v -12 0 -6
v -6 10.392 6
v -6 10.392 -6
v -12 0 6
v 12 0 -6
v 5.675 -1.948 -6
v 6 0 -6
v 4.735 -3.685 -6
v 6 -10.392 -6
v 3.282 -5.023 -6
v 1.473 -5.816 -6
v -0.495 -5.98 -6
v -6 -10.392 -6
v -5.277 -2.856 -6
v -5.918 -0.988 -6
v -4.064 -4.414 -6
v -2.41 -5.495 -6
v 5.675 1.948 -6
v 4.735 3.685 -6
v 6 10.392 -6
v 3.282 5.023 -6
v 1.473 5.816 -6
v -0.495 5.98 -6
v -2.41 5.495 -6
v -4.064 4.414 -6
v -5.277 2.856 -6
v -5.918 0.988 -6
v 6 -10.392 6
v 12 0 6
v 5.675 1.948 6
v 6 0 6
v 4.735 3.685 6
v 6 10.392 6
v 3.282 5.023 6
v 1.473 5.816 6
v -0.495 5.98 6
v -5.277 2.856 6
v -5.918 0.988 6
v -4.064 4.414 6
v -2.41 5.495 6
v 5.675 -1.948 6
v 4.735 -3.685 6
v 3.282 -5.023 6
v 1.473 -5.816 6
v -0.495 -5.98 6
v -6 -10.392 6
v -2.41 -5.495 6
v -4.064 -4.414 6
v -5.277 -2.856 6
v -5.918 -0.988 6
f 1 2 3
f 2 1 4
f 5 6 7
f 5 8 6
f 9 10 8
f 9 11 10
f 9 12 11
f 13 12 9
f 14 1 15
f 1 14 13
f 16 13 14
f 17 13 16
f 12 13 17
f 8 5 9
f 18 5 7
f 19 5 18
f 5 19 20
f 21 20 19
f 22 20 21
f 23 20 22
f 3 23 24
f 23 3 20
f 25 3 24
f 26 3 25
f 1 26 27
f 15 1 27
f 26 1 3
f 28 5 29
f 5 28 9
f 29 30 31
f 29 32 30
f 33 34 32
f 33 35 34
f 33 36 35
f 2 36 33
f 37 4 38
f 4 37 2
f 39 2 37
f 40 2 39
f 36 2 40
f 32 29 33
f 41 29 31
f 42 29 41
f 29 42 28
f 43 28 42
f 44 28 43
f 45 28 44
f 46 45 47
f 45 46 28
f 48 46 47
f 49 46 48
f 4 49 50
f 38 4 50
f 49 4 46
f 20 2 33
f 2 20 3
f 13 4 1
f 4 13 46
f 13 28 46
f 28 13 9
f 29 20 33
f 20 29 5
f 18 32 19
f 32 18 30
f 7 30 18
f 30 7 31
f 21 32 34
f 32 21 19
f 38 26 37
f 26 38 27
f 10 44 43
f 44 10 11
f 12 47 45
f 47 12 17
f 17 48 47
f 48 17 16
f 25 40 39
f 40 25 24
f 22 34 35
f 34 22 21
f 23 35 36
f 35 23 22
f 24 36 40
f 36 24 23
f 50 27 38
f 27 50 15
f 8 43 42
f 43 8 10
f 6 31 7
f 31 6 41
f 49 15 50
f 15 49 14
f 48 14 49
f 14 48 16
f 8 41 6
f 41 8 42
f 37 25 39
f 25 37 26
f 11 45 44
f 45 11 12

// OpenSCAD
// file: metric_bolt_functions.scad
function get_metric_bolt_head_height(size) = size;
function get_metric_bolt_head_diameter(size) = size * 2;
function get_metric_bolt_washer_diameter_safe_working_clearance(size) = 
    (size < 20) ?
        4 * size
    :
        3 * size
;
// file: beam_hexagonal.scad
// include <../../config.scad>;

module beam_hexagonal(L, d, centre = true, suppress_shopping_outputs = false) {
    radius = d / 2;
    linear_extrude(L, center = centre) polygon([[radius, 0], [radius * cos(60), radius * sin(60)], [radius * cos(120), radius * sin(120)], [radius * cos(180), radius * sin(180)], [radius * cos(240), radius * sin(240)], [radius * cos(300), radius * sin(300)]]);
    // Shopping
    if (!suppress_shopping_outputs) {
        echo(str("Hexagonal beam: Hexagonal beam Φ", d, "mm x ", L, "mm - x1"));
    }
}

// $fn = 200;
beam_hexagonal(500, 50);
// main file
// include <../../config.scad>;
use <./beam_hexagonal.scad>;
use <./metric_bolt_functions.scad>;

module metric_nut(size, centre = true) {
    height = get_metric_bolt_head_height(size);
    diameter = get_metric_bolt_head_diameter(size);
    radius = diameter / 2;
    color("gray") difference() {
        // body
        beam_hexagonal(height, diameter, centre = centre, suppress_shopping_outputs = true);
        // hole
        cylinder(height, size / 2, size / 2, center = centre);
    }
    // Shopping
    echo(str("Nut: Nut M", size, " - x1"));
}

// $fn = 200;
metric_nut(12);
